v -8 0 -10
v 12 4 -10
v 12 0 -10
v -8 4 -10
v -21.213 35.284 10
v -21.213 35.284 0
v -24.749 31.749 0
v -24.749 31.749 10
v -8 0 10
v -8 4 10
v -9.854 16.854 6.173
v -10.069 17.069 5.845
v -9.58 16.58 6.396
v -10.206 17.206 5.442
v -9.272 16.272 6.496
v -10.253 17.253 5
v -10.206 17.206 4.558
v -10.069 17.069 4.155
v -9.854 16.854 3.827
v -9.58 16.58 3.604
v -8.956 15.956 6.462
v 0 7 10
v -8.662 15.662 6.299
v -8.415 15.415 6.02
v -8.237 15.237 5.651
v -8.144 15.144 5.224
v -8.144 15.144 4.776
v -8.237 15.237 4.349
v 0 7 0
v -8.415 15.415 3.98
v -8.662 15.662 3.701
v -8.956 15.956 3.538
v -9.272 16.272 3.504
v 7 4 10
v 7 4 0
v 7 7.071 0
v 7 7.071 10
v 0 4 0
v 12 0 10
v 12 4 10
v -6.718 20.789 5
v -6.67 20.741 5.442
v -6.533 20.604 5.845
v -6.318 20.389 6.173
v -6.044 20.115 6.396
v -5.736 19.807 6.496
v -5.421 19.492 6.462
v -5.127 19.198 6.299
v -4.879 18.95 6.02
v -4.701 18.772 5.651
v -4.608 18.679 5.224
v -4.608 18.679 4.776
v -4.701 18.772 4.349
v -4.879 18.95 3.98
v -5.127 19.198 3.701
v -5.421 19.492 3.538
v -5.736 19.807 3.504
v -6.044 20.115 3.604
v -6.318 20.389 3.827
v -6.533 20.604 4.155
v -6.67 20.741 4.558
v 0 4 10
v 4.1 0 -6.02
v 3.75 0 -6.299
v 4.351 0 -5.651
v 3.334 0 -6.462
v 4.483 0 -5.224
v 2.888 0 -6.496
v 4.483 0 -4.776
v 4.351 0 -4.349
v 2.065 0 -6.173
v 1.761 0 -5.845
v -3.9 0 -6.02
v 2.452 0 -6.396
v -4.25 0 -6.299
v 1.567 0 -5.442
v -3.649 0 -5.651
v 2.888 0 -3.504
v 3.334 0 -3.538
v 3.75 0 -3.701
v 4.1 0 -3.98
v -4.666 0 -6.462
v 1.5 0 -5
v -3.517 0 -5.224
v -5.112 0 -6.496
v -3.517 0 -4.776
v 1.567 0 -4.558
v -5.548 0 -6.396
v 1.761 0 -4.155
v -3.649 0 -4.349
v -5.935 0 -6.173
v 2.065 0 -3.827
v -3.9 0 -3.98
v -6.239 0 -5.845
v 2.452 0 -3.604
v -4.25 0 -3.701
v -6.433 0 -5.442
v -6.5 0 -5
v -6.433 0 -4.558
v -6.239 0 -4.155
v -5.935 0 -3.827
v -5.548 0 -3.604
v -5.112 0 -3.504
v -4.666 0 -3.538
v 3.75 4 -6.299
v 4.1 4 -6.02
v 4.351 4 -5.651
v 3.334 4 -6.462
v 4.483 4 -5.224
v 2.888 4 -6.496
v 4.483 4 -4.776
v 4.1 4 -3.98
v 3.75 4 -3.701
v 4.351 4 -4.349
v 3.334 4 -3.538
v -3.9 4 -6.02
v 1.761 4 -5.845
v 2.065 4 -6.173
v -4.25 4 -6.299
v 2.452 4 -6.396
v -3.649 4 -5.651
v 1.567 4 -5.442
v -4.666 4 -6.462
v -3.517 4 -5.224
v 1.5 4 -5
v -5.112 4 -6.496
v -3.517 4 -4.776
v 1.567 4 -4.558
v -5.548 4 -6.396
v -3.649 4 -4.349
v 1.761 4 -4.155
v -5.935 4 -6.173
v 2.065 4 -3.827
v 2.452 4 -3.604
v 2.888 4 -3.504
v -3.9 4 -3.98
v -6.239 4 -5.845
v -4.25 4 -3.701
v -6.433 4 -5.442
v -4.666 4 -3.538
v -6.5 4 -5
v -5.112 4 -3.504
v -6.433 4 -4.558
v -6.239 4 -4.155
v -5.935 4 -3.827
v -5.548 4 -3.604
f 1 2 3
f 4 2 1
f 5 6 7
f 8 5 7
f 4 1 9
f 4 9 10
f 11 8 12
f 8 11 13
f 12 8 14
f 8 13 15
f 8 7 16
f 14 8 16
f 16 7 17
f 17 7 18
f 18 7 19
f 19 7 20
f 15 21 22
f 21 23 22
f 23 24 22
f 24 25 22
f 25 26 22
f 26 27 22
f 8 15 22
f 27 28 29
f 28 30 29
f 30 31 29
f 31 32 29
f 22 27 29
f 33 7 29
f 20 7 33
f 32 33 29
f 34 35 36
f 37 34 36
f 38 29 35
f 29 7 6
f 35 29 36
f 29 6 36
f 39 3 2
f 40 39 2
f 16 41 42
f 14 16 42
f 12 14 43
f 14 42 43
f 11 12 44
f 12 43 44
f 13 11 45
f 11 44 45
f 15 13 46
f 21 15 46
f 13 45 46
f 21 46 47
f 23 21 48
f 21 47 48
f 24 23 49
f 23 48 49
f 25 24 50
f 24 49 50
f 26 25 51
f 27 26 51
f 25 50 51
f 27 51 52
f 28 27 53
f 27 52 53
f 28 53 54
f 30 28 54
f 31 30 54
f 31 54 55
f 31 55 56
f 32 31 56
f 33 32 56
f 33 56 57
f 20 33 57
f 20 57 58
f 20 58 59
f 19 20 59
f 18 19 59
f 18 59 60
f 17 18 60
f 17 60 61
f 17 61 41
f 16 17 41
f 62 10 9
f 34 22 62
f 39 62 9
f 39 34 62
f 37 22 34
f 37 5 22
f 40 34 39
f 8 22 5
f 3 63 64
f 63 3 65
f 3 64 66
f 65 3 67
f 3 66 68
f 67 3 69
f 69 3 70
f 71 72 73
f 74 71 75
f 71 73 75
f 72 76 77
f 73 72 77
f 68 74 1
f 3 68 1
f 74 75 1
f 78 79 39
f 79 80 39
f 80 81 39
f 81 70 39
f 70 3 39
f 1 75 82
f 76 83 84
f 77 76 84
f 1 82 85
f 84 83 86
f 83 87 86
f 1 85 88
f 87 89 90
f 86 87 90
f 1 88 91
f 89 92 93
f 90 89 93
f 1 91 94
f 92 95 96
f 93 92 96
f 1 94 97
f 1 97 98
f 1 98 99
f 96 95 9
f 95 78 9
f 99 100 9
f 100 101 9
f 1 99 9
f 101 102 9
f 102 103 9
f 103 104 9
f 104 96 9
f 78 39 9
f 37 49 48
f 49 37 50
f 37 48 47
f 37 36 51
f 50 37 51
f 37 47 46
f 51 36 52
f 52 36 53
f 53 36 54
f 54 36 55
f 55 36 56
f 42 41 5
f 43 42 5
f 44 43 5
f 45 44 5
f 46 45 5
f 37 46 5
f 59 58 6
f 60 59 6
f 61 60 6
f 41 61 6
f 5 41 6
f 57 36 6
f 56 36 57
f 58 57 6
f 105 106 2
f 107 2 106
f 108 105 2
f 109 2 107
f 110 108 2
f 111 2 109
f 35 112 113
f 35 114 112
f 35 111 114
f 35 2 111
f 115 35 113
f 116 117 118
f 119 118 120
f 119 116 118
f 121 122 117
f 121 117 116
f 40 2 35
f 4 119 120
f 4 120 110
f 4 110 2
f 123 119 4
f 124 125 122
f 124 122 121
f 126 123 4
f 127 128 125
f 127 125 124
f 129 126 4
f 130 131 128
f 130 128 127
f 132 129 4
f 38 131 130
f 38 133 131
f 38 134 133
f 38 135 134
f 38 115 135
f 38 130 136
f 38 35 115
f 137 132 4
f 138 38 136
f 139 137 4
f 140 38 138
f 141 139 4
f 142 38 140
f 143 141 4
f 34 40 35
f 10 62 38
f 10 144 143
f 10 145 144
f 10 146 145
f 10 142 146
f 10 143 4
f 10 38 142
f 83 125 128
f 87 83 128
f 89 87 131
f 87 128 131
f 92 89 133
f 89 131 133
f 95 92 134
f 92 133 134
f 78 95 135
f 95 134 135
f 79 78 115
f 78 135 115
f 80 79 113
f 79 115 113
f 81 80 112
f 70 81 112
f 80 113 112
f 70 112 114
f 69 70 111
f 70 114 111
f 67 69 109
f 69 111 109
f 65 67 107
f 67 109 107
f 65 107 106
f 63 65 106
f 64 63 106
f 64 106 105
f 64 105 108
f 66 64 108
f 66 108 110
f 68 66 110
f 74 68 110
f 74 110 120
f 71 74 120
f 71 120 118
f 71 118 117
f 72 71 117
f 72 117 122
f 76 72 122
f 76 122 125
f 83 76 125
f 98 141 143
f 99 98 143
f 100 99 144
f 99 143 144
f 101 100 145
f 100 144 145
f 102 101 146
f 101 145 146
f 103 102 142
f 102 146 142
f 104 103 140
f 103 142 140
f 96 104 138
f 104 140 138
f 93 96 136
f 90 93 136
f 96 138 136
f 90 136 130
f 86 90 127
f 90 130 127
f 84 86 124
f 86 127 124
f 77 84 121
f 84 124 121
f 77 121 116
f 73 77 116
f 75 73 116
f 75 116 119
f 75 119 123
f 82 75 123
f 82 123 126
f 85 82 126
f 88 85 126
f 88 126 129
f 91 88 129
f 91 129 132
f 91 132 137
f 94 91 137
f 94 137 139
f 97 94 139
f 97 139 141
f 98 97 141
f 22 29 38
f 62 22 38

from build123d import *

# Parameters (mm, degrees)
EXTRUDE_1_DEPTH      = 10
EXTRUDE_2_DEPTH      = 10
EXTRUDE_2_DEPTH_BACK = 10
SKETCH_2_W           = 20
SKETCH_2_H           = 4
SKETCH_3_R           = 1.5
CUT_EXTRUDE_1_DEPTH  = 10
SKETCH_4_R           = 1.5
CUT_EXTRUDE_2_DEPTH  = 10


with BuildPart() as part:
    # 草图1 → 凸台-拉伸1 (new body)
    with BuildSketch(Plane.XY):
        Polygon((0, 0), (12, 0), (12, 4), (7, 4), (7, 7.071067812), (-21.213203436, 35.284271247), (-24.748737342, 31.748737342), (0, 7), align=None)
    extrude(amount=EXTRUDE_1_DEPTH)

    # 草图2 → 凸台-拉伸2 (add, two sides: drawn at the far end of the back side and taken through both)
    with BuildSketch(Plane(origin=(0, 0, 0), x_dir=(-1, 0, 0), z_dir=(0, 0, -1)).offset(-EXTRUDE_2_DEPTH_BACK)):
        with Locations((-2, 2)):
            Rectangle(SKETCH_2_W, SKETCH_2_H)
    extrude(amount=EXTRUDE_2_DEPTH + EXTRUDE_2_DEPTH_BACK)

    # 草图3 → 切除-拉伸1 (cut)
    with BuildSketch(Plane(origin=(7.035533906, 7.035533906, 0), x_dir=(0, 0, -1), z_dir=(0.7071067811865465, 0.7071067811865486, 0))):
        with Locations(Location((-5, 17.949747468, 0), (0, 0, 90))):
            Circle(SKETCH_3_R)
    extrude(amount=-CUT_EXTRUDE_1_DEPTH, mode=Mode.SUBTRACT)

    # 草图4 → 切除-拉伸2 (cut)
    with BuildSketch(Plane(origin=(0, 4, 0), x_dir=(1, 0, 0), z_dir=(0, 1, 0))):
        with Locations(Location((-5, 5, 0), (0, 0, 180))):
            Circle(SKETCH_4_R)
        with Locations(Location((3, 5, 0), (0, 0, 180))):
            Circle(SKETCH_4_R)
    extrude(amount=-CUT_EXTRUDE_2_DEPTH, mode=Mode.SUBTRACT)


solid = part.part
